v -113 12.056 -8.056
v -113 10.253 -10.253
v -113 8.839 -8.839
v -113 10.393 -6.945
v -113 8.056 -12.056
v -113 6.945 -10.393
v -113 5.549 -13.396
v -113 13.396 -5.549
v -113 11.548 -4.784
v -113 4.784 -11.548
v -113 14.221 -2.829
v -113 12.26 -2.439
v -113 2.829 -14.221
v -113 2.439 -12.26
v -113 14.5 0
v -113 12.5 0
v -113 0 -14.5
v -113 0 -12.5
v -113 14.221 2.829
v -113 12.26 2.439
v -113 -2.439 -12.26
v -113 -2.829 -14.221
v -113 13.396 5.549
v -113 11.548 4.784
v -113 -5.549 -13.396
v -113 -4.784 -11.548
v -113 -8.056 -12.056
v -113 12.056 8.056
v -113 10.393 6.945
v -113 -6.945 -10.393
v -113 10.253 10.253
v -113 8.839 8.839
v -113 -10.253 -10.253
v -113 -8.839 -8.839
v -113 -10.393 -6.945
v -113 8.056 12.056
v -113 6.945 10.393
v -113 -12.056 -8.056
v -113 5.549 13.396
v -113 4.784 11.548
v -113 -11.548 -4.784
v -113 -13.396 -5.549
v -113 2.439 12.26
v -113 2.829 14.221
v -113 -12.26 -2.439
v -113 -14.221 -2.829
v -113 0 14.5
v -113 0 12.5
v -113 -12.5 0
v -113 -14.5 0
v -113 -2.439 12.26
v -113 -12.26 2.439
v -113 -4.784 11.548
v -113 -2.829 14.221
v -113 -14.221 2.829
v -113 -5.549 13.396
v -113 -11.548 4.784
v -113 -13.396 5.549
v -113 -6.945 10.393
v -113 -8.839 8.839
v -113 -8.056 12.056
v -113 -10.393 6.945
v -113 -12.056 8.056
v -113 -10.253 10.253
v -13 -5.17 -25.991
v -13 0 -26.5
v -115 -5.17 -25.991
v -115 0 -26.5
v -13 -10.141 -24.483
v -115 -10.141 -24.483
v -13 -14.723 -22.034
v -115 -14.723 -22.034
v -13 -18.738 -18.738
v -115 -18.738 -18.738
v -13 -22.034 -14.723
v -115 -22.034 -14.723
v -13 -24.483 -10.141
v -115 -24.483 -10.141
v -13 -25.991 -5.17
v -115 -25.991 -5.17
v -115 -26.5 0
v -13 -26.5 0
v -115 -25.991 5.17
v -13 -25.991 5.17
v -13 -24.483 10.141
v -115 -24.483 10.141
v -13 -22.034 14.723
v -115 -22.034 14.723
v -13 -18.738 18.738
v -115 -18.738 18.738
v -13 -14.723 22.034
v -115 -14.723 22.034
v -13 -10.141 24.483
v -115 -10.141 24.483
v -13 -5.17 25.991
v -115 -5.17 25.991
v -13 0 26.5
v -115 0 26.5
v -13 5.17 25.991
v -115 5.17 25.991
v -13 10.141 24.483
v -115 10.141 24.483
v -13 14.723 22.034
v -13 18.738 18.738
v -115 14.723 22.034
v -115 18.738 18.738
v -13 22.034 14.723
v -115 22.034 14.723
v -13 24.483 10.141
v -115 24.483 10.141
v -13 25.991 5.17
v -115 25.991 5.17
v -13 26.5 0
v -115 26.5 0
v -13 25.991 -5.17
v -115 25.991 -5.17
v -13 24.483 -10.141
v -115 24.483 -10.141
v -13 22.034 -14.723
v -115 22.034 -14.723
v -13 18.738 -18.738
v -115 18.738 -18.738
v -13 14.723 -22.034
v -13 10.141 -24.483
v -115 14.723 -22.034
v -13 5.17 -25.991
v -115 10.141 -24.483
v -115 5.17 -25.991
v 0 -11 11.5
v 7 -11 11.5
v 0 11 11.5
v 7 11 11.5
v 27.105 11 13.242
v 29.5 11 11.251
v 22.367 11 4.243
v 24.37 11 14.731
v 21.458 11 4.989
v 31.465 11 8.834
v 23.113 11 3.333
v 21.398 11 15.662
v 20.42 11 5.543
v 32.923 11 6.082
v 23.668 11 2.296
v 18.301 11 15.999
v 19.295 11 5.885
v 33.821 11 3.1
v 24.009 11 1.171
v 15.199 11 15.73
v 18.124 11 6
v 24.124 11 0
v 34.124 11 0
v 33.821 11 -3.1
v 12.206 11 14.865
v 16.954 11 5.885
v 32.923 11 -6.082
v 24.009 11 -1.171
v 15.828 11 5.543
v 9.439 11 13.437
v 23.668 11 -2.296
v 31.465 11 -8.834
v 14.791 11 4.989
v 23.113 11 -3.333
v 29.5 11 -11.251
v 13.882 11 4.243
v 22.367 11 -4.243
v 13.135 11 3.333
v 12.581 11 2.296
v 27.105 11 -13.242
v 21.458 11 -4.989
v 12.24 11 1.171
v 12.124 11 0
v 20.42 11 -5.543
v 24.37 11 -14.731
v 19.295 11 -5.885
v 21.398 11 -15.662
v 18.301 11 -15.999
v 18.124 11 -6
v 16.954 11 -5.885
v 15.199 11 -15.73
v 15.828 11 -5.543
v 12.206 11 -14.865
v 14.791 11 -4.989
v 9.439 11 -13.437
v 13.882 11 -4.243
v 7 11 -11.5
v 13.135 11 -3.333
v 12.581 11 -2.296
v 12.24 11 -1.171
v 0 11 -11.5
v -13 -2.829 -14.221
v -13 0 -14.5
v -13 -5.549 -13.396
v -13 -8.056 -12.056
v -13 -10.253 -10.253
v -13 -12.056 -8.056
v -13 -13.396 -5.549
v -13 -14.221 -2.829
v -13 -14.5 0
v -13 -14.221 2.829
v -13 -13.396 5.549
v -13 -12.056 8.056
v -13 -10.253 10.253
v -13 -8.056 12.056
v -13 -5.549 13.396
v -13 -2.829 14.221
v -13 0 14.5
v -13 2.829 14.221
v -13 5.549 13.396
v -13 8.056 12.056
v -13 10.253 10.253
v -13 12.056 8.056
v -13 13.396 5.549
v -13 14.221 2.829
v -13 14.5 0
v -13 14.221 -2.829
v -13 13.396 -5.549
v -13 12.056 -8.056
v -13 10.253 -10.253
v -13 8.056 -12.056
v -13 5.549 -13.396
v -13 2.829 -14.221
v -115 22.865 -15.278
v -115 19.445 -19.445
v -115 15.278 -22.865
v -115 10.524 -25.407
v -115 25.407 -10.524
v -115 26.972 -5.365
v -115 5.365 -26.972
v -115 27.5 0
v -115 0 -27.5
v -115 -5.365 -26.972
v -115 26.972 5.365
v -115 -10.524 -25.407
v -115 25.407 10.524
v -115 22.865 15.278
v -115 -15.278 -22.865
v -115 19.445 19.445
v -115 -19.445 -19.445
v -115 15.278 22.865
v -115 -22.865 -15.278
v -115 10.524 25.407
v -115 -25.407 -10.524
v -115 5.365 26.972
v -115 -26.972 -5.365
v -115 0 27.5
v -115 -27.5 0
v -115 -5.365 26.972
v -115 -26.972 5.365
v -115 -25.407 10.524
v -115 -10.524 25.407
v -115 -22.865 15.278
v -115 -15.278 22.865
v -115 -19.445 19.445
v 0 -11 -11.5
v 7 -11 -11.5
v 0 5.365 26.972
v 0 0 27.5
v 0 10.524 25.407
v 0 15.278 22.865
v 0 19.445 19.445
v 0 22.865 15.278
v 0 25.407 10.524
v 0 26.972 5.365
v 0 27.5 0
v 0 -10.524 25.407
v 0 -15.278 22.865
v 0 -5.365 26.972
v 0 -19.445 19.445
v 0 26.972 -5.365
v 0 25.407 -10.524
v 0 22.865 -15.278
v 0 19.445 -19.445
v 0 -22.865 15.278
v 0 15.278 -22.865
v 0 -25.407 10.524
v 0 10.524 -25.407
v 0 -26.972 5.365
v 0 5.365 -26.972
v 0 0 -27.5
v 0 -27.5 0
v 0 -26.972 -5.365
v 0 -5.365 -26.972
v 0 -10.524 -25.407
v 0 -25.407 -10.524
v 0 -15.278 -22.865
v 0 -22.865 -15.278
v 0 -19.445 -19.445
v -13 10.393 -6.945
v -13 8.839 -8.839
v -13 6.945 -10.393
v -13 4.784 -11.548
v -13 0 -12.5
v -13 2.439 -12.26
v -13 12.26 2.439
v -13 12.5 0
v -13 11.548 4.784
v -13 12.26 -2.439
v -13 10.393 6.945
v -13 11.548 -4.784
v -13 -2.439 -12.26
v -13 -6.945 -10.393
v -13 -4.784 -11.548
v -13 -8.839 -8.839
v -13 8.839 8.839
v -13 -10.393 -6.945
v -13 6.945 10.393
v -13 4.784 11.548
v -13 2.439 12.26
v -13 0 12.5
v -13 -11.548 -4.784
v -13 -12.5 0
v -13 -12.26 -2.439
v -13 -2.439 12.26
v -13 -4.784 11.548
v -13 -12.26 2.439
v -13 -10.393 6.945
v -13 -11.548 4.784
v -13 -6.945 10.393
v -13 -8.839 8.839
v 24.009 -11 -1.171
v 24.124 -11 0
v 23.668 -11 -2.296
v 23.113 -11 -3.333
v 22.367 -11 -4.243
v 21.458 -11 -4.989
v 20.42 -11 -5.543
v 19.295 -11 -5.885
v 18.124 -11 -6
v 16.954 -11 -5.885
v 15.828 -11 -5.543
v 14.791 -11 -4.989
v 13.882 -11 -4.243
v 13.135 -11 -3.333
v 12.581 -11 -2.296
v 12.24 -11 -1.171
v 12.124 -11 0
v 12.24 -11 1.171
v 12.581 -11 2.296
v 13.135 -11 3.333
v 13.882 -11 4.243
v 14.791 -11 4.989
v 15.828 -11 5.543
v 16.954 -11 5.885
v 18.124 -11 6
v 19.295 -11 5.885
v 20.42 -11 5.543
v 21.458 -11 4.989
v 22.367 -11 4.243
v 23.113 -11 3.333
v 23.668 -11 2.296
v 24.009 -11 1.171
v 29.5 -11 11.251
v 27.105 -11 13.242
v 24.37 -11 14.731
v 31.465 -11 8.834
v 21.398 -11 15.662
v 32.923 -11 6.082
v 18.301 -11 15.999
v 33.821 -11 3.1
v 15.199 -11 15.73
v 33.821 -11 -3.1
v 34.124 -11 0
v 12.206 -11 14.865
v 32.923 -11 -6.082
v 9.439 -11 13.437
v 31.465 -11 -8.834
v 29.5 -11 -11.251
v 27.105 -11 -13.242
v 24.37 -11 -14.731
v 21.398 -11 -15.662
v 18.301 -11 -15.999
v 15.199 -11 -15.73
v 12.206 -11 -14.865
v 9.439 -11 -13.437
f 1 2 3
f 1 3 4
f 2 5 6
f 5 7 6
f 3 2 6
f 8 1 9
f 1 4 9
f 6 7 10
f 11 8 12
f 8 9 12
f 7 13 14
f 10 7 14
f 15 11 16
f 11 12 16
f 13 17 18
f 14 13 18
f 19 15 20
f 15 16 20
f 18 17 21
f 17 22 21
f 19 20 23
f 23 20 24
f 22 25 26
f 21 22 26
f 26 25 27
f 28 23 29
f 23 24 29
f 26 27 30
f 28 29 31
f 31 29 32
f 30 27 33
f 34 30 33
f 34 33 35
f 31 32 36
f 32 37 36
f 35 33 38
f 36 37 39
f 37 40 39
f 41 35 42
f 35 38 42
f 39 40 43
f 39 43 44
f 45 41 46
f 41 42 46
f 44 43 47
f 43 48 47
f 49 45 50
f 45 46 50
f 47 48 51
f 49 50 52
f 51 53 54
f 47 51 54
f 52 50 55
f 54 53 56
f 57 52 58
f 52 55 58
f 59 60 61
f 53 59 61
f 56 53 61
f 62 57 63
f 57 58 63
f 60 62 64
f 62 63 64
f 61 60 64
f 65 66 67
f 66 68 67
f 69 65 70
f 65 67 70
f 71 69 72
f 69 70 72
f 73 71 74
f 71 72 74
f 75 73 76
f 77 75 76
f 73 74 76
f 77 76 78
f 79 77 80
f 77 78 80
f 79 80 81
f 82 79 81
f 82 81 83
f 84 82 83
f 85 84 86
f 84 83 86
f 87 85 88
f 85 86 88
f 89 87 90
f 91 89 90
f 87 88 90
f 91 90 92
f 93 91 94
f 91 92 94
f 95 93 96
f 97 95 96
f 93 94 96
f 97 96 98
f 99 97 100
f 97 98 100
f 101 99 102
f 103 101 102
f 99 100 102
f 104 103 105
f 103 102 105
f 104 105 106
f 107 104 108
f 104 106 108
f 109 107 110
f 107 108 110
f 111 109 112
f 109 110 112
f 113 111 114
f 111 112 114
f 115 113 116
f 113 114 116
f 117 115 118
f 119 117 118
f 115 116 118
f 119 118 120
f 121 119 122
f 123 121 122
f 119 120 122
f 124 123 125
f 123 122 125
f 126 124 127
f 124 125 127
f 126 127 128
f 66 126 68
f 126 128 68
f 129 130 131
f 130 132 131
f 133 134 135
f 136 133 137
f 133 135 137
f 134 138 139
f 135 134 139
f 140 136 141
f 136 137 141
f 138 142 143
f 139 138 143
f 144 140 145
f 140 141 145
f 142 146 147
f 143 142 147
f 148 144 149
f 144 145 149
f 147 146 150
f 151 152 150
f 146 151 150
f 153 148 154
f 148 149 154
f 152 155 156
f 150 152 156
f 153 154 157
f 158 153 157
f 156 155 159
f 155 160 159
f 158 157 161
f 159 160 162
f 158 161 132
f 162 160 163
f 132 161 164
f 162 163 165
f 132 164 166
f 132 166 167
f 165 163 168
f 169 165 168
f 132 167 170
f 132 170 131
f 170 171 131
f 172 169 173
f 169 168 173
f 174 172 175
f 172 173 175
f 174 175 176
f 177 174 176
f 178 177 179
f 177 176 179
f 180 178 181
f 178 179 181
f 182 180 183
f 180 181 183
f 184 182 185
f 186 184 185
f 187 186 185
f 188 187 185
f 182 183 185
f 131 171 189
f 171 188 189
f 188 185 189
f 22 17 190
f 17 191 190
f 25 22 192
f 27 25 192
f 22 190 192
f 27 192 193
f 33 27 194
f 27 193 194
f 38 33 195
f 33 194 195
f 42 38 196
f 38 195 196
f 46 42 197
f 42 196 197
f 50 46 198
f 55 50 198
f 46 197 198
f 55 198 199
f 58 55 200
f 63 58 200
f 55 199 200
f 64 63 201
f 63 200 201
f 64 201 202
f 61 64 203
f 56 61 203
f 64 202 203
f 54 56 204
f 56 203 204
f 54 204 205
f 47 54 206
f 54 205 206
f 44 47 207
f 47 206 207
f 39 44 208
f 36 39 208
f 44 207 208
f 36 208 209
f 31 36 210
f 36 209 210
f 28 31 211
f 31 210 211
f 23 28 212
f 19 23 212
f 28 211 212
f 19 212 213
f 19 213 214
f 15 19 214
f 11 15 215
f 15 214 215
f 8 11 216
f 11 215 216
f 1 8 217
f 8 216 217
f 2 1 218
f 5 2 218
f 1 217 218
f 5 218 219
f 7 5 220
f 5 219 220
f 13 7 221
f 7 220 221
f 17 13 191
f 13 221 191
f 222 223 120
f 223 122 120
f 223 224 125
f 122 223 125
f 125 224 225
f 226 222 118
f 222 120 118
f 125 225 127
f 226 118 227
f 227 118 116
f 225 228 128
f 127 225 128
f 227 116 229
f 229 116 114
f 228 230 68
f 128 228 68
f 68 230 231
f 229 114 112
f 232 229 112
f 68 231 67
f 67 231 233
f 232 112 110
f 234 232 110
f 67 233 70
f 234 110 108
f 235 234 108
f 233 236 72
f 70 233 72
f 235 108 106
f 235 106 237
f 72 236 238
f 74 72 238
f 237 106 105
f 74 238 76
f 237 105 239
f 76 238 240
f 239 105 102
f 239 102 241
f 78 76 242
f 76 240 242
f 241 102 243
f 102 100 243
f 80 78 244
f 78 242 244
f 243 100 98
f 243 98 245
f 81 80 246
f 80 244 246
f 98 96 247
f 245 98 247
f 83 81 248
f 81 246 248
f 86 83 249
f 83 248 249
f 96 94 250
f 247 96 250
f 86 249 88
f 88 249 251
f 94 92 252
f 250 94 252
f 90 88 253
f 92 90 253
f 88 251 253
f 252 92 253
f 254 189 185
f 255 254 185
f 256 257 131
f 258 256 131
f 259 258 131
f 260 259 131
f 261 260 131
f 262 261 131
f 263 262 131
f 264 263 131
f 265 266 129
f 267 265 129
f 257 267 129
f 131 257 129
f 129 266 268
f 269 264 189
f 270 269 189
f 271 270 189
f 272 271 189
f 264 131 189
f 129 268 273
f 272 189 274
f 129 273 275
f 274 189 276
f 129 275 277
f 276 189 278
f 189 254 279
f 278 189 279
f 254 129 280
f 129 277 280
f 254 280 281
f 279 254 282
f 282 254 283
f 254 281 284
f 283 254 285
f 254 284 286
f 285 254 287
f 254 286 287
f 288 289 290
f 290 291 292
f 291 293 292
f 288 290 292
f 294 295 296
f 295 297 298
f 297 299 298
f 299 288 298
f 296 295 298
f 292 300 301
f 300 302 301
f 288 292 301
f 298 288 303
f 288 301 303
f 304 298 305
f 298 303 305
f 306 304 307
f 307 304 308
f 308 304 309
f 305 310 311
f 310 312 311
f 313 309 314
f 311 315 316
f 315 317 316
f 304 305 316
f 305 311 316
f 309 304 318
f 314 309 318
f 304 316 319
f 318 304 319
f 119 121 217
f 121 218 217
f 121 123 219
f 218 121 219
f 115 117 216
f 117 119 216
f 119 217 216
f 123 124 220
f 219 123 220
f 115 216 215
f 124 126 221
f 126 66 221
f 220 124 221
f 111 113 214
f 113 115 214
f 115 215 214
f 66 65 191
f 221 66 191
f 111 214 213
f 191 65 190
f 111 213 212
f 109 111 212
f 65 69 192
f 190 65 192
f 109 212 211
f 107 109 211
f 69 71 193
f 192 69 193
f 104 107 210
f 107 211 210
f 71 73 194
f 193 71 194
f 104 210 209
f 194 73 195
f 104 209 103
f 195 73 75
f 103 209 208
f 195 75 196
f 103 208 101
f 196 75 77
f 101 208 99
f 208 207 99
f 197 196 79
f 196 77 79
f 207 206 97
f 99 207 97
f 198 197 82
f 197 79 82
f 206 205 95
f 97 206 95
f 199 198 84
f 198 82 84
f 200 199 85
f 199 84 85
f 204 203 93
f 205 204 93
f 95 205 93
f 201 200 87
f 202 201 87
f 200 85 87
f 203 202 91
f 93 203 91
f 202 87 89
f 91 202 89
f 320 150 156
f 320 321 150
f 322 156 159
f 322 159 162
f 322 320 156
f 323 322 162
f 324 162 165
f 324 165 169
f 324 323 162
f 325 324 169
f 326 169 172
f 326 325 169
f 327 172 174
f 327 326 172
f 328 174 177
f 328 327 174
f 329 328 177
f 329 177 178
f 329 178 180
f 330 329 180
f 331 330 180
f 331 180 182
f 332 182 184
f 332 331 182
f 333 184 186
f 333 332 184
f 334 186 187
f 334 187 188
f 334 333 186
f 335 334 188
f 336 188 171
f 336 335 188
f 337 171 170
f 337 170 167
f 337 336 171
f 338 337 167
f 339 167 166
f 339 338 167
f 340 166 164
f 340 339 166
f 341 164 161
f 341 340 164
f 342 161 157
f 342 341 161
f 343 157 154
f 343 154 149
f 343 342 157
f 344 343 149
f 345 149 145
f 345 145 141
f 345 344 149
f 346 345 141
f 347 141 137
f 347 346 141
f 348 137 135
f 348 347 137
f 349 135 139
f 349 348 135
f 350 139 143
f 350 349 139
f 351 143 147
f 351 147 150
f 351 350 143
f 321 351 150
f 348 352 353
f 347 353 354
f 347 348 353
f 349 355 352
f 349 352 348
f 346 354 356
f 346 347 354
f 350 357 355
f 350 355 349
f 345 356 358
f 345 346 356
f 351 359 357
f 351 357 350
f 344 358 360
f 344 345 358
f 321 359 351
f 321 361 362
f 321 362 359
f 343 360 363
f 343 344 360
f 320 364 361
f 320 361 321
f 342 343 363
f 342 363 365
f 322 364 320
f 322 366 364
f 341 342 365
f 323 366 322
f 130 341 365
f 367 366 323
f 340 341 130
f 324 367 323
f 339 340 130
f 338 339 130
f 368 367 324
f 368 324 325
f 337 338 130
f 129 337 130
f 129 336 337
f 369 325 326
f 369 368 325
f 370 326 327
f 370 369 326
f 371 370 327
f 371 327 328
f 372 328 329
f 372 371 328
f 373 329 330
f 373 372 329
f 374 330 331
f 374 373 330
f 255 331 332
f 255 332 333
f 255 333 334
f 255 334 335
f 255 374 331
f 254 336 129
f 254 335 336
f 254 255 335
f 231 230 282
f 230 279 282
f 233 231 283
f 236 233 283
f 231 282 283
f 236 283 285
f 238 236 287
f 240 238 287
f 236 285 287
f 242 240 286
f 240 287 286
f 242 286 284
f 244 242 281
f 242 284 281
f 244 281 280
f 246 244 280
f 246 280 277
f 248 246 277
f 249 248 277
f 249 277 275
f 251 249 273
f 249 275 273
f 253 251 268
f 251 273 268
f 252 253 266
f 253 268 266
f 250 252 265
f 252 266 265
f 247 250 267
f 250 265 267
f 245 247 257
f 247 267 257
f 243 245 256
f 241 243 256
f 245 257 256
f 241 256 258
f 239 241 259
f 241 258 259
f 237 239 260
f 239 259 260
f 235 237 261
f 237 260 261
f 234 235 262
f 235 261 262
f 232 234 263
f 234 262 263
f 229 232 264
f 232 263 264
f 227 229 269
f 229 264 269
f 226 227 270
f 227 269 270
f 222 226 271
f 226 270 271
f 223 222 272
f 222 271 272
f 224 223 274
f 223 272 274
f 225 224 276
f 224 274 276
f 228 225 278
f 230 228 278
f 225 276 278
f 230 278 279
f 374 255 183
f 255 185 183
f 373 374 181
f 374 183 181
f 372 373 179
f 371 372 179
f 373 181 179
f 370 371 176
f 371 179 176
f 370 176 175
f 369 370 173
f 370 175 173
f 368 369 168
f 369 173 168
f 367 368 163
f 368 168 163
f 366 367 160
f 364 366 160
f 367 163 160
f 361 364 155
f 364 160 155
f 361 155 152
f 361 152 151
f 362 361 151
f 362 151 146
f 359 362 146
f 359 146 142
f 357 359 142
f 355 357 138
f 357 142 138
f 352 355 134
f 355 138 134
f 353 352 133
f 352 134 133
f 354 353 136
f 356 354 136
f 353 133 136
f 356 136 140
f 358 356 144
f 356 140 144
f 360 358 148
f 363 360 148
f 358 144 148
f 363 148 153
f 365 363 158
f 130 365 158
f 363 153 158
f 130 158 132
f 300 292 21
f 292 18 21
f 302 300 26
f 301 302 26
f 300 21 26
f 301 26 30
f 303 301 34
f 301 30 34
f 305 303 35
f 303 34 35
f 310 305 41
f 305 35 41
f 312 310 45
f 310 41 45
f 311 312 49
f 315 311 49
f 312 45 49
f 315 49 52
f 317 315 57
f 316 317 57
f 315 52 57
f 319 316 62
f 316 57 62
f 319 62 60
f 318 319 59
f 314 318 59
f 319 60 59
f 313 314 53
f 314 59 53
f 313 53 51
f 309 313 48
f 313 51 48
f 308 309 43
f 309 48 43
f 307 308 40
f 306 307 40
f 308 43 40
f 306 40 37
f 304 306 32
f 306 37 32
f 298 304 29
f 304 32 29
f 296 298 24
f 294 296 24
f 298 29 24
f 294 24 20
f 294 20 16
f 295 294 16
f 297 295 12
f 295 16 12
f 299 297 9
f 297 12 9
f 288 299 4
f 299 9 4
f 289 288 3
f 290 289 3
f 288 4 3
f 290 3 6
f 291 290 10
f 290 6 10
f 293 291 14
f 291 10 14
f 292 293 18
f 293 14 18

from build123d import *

# Parameters (mm, degrees)
SKETCH2_R           = 6
BOSS_EXTRUDE1_DEPTH = 11


with BuildPart() as part:
    # Sketch1 → Revolve1 (revolve)
    with BuildSketch(Plane(origin=(0, 0, 0), x_dir=(1, 0, 0), z_dir=(0, 1, 0))):
        Polygon((0, 0), (-13, 0), (-13, 12.5), (-113, 12.5), (-113, 14.5), (-13, 14.5), (-13, 26.5), (-115, 26.5), (-115, 27.5), (0, 27.5), align=None)
    revolve(axis=Axis((0, 0, 0), (-1, 0, 0)))

    # Sketch2 → Boss-Extrude1 (add, symmetric)
    with BuildSketch(Plane(origin=(0, 0, 0), x_dir=(1, 0, 0), z_dir=(0, 1, 0))):
        with BuildLine():
            Line((0, 11.5), (7, 11.5))
            ThreePointArc((7, 11.5), (34.124297731, 0), (7, -11.5))
            Line((7, -11.5), (0, -11.5))
            Line((0, -11.5), (0, 11.5))
        make_face()
        with Locations((18.124297731, 0)):
            Circle(SKETCH2_R, mode=Mode.SUBTRACT)
    extrude(amount=BOSS_EXTRUDE1_DEPTH, both=True)


solid = part.part
